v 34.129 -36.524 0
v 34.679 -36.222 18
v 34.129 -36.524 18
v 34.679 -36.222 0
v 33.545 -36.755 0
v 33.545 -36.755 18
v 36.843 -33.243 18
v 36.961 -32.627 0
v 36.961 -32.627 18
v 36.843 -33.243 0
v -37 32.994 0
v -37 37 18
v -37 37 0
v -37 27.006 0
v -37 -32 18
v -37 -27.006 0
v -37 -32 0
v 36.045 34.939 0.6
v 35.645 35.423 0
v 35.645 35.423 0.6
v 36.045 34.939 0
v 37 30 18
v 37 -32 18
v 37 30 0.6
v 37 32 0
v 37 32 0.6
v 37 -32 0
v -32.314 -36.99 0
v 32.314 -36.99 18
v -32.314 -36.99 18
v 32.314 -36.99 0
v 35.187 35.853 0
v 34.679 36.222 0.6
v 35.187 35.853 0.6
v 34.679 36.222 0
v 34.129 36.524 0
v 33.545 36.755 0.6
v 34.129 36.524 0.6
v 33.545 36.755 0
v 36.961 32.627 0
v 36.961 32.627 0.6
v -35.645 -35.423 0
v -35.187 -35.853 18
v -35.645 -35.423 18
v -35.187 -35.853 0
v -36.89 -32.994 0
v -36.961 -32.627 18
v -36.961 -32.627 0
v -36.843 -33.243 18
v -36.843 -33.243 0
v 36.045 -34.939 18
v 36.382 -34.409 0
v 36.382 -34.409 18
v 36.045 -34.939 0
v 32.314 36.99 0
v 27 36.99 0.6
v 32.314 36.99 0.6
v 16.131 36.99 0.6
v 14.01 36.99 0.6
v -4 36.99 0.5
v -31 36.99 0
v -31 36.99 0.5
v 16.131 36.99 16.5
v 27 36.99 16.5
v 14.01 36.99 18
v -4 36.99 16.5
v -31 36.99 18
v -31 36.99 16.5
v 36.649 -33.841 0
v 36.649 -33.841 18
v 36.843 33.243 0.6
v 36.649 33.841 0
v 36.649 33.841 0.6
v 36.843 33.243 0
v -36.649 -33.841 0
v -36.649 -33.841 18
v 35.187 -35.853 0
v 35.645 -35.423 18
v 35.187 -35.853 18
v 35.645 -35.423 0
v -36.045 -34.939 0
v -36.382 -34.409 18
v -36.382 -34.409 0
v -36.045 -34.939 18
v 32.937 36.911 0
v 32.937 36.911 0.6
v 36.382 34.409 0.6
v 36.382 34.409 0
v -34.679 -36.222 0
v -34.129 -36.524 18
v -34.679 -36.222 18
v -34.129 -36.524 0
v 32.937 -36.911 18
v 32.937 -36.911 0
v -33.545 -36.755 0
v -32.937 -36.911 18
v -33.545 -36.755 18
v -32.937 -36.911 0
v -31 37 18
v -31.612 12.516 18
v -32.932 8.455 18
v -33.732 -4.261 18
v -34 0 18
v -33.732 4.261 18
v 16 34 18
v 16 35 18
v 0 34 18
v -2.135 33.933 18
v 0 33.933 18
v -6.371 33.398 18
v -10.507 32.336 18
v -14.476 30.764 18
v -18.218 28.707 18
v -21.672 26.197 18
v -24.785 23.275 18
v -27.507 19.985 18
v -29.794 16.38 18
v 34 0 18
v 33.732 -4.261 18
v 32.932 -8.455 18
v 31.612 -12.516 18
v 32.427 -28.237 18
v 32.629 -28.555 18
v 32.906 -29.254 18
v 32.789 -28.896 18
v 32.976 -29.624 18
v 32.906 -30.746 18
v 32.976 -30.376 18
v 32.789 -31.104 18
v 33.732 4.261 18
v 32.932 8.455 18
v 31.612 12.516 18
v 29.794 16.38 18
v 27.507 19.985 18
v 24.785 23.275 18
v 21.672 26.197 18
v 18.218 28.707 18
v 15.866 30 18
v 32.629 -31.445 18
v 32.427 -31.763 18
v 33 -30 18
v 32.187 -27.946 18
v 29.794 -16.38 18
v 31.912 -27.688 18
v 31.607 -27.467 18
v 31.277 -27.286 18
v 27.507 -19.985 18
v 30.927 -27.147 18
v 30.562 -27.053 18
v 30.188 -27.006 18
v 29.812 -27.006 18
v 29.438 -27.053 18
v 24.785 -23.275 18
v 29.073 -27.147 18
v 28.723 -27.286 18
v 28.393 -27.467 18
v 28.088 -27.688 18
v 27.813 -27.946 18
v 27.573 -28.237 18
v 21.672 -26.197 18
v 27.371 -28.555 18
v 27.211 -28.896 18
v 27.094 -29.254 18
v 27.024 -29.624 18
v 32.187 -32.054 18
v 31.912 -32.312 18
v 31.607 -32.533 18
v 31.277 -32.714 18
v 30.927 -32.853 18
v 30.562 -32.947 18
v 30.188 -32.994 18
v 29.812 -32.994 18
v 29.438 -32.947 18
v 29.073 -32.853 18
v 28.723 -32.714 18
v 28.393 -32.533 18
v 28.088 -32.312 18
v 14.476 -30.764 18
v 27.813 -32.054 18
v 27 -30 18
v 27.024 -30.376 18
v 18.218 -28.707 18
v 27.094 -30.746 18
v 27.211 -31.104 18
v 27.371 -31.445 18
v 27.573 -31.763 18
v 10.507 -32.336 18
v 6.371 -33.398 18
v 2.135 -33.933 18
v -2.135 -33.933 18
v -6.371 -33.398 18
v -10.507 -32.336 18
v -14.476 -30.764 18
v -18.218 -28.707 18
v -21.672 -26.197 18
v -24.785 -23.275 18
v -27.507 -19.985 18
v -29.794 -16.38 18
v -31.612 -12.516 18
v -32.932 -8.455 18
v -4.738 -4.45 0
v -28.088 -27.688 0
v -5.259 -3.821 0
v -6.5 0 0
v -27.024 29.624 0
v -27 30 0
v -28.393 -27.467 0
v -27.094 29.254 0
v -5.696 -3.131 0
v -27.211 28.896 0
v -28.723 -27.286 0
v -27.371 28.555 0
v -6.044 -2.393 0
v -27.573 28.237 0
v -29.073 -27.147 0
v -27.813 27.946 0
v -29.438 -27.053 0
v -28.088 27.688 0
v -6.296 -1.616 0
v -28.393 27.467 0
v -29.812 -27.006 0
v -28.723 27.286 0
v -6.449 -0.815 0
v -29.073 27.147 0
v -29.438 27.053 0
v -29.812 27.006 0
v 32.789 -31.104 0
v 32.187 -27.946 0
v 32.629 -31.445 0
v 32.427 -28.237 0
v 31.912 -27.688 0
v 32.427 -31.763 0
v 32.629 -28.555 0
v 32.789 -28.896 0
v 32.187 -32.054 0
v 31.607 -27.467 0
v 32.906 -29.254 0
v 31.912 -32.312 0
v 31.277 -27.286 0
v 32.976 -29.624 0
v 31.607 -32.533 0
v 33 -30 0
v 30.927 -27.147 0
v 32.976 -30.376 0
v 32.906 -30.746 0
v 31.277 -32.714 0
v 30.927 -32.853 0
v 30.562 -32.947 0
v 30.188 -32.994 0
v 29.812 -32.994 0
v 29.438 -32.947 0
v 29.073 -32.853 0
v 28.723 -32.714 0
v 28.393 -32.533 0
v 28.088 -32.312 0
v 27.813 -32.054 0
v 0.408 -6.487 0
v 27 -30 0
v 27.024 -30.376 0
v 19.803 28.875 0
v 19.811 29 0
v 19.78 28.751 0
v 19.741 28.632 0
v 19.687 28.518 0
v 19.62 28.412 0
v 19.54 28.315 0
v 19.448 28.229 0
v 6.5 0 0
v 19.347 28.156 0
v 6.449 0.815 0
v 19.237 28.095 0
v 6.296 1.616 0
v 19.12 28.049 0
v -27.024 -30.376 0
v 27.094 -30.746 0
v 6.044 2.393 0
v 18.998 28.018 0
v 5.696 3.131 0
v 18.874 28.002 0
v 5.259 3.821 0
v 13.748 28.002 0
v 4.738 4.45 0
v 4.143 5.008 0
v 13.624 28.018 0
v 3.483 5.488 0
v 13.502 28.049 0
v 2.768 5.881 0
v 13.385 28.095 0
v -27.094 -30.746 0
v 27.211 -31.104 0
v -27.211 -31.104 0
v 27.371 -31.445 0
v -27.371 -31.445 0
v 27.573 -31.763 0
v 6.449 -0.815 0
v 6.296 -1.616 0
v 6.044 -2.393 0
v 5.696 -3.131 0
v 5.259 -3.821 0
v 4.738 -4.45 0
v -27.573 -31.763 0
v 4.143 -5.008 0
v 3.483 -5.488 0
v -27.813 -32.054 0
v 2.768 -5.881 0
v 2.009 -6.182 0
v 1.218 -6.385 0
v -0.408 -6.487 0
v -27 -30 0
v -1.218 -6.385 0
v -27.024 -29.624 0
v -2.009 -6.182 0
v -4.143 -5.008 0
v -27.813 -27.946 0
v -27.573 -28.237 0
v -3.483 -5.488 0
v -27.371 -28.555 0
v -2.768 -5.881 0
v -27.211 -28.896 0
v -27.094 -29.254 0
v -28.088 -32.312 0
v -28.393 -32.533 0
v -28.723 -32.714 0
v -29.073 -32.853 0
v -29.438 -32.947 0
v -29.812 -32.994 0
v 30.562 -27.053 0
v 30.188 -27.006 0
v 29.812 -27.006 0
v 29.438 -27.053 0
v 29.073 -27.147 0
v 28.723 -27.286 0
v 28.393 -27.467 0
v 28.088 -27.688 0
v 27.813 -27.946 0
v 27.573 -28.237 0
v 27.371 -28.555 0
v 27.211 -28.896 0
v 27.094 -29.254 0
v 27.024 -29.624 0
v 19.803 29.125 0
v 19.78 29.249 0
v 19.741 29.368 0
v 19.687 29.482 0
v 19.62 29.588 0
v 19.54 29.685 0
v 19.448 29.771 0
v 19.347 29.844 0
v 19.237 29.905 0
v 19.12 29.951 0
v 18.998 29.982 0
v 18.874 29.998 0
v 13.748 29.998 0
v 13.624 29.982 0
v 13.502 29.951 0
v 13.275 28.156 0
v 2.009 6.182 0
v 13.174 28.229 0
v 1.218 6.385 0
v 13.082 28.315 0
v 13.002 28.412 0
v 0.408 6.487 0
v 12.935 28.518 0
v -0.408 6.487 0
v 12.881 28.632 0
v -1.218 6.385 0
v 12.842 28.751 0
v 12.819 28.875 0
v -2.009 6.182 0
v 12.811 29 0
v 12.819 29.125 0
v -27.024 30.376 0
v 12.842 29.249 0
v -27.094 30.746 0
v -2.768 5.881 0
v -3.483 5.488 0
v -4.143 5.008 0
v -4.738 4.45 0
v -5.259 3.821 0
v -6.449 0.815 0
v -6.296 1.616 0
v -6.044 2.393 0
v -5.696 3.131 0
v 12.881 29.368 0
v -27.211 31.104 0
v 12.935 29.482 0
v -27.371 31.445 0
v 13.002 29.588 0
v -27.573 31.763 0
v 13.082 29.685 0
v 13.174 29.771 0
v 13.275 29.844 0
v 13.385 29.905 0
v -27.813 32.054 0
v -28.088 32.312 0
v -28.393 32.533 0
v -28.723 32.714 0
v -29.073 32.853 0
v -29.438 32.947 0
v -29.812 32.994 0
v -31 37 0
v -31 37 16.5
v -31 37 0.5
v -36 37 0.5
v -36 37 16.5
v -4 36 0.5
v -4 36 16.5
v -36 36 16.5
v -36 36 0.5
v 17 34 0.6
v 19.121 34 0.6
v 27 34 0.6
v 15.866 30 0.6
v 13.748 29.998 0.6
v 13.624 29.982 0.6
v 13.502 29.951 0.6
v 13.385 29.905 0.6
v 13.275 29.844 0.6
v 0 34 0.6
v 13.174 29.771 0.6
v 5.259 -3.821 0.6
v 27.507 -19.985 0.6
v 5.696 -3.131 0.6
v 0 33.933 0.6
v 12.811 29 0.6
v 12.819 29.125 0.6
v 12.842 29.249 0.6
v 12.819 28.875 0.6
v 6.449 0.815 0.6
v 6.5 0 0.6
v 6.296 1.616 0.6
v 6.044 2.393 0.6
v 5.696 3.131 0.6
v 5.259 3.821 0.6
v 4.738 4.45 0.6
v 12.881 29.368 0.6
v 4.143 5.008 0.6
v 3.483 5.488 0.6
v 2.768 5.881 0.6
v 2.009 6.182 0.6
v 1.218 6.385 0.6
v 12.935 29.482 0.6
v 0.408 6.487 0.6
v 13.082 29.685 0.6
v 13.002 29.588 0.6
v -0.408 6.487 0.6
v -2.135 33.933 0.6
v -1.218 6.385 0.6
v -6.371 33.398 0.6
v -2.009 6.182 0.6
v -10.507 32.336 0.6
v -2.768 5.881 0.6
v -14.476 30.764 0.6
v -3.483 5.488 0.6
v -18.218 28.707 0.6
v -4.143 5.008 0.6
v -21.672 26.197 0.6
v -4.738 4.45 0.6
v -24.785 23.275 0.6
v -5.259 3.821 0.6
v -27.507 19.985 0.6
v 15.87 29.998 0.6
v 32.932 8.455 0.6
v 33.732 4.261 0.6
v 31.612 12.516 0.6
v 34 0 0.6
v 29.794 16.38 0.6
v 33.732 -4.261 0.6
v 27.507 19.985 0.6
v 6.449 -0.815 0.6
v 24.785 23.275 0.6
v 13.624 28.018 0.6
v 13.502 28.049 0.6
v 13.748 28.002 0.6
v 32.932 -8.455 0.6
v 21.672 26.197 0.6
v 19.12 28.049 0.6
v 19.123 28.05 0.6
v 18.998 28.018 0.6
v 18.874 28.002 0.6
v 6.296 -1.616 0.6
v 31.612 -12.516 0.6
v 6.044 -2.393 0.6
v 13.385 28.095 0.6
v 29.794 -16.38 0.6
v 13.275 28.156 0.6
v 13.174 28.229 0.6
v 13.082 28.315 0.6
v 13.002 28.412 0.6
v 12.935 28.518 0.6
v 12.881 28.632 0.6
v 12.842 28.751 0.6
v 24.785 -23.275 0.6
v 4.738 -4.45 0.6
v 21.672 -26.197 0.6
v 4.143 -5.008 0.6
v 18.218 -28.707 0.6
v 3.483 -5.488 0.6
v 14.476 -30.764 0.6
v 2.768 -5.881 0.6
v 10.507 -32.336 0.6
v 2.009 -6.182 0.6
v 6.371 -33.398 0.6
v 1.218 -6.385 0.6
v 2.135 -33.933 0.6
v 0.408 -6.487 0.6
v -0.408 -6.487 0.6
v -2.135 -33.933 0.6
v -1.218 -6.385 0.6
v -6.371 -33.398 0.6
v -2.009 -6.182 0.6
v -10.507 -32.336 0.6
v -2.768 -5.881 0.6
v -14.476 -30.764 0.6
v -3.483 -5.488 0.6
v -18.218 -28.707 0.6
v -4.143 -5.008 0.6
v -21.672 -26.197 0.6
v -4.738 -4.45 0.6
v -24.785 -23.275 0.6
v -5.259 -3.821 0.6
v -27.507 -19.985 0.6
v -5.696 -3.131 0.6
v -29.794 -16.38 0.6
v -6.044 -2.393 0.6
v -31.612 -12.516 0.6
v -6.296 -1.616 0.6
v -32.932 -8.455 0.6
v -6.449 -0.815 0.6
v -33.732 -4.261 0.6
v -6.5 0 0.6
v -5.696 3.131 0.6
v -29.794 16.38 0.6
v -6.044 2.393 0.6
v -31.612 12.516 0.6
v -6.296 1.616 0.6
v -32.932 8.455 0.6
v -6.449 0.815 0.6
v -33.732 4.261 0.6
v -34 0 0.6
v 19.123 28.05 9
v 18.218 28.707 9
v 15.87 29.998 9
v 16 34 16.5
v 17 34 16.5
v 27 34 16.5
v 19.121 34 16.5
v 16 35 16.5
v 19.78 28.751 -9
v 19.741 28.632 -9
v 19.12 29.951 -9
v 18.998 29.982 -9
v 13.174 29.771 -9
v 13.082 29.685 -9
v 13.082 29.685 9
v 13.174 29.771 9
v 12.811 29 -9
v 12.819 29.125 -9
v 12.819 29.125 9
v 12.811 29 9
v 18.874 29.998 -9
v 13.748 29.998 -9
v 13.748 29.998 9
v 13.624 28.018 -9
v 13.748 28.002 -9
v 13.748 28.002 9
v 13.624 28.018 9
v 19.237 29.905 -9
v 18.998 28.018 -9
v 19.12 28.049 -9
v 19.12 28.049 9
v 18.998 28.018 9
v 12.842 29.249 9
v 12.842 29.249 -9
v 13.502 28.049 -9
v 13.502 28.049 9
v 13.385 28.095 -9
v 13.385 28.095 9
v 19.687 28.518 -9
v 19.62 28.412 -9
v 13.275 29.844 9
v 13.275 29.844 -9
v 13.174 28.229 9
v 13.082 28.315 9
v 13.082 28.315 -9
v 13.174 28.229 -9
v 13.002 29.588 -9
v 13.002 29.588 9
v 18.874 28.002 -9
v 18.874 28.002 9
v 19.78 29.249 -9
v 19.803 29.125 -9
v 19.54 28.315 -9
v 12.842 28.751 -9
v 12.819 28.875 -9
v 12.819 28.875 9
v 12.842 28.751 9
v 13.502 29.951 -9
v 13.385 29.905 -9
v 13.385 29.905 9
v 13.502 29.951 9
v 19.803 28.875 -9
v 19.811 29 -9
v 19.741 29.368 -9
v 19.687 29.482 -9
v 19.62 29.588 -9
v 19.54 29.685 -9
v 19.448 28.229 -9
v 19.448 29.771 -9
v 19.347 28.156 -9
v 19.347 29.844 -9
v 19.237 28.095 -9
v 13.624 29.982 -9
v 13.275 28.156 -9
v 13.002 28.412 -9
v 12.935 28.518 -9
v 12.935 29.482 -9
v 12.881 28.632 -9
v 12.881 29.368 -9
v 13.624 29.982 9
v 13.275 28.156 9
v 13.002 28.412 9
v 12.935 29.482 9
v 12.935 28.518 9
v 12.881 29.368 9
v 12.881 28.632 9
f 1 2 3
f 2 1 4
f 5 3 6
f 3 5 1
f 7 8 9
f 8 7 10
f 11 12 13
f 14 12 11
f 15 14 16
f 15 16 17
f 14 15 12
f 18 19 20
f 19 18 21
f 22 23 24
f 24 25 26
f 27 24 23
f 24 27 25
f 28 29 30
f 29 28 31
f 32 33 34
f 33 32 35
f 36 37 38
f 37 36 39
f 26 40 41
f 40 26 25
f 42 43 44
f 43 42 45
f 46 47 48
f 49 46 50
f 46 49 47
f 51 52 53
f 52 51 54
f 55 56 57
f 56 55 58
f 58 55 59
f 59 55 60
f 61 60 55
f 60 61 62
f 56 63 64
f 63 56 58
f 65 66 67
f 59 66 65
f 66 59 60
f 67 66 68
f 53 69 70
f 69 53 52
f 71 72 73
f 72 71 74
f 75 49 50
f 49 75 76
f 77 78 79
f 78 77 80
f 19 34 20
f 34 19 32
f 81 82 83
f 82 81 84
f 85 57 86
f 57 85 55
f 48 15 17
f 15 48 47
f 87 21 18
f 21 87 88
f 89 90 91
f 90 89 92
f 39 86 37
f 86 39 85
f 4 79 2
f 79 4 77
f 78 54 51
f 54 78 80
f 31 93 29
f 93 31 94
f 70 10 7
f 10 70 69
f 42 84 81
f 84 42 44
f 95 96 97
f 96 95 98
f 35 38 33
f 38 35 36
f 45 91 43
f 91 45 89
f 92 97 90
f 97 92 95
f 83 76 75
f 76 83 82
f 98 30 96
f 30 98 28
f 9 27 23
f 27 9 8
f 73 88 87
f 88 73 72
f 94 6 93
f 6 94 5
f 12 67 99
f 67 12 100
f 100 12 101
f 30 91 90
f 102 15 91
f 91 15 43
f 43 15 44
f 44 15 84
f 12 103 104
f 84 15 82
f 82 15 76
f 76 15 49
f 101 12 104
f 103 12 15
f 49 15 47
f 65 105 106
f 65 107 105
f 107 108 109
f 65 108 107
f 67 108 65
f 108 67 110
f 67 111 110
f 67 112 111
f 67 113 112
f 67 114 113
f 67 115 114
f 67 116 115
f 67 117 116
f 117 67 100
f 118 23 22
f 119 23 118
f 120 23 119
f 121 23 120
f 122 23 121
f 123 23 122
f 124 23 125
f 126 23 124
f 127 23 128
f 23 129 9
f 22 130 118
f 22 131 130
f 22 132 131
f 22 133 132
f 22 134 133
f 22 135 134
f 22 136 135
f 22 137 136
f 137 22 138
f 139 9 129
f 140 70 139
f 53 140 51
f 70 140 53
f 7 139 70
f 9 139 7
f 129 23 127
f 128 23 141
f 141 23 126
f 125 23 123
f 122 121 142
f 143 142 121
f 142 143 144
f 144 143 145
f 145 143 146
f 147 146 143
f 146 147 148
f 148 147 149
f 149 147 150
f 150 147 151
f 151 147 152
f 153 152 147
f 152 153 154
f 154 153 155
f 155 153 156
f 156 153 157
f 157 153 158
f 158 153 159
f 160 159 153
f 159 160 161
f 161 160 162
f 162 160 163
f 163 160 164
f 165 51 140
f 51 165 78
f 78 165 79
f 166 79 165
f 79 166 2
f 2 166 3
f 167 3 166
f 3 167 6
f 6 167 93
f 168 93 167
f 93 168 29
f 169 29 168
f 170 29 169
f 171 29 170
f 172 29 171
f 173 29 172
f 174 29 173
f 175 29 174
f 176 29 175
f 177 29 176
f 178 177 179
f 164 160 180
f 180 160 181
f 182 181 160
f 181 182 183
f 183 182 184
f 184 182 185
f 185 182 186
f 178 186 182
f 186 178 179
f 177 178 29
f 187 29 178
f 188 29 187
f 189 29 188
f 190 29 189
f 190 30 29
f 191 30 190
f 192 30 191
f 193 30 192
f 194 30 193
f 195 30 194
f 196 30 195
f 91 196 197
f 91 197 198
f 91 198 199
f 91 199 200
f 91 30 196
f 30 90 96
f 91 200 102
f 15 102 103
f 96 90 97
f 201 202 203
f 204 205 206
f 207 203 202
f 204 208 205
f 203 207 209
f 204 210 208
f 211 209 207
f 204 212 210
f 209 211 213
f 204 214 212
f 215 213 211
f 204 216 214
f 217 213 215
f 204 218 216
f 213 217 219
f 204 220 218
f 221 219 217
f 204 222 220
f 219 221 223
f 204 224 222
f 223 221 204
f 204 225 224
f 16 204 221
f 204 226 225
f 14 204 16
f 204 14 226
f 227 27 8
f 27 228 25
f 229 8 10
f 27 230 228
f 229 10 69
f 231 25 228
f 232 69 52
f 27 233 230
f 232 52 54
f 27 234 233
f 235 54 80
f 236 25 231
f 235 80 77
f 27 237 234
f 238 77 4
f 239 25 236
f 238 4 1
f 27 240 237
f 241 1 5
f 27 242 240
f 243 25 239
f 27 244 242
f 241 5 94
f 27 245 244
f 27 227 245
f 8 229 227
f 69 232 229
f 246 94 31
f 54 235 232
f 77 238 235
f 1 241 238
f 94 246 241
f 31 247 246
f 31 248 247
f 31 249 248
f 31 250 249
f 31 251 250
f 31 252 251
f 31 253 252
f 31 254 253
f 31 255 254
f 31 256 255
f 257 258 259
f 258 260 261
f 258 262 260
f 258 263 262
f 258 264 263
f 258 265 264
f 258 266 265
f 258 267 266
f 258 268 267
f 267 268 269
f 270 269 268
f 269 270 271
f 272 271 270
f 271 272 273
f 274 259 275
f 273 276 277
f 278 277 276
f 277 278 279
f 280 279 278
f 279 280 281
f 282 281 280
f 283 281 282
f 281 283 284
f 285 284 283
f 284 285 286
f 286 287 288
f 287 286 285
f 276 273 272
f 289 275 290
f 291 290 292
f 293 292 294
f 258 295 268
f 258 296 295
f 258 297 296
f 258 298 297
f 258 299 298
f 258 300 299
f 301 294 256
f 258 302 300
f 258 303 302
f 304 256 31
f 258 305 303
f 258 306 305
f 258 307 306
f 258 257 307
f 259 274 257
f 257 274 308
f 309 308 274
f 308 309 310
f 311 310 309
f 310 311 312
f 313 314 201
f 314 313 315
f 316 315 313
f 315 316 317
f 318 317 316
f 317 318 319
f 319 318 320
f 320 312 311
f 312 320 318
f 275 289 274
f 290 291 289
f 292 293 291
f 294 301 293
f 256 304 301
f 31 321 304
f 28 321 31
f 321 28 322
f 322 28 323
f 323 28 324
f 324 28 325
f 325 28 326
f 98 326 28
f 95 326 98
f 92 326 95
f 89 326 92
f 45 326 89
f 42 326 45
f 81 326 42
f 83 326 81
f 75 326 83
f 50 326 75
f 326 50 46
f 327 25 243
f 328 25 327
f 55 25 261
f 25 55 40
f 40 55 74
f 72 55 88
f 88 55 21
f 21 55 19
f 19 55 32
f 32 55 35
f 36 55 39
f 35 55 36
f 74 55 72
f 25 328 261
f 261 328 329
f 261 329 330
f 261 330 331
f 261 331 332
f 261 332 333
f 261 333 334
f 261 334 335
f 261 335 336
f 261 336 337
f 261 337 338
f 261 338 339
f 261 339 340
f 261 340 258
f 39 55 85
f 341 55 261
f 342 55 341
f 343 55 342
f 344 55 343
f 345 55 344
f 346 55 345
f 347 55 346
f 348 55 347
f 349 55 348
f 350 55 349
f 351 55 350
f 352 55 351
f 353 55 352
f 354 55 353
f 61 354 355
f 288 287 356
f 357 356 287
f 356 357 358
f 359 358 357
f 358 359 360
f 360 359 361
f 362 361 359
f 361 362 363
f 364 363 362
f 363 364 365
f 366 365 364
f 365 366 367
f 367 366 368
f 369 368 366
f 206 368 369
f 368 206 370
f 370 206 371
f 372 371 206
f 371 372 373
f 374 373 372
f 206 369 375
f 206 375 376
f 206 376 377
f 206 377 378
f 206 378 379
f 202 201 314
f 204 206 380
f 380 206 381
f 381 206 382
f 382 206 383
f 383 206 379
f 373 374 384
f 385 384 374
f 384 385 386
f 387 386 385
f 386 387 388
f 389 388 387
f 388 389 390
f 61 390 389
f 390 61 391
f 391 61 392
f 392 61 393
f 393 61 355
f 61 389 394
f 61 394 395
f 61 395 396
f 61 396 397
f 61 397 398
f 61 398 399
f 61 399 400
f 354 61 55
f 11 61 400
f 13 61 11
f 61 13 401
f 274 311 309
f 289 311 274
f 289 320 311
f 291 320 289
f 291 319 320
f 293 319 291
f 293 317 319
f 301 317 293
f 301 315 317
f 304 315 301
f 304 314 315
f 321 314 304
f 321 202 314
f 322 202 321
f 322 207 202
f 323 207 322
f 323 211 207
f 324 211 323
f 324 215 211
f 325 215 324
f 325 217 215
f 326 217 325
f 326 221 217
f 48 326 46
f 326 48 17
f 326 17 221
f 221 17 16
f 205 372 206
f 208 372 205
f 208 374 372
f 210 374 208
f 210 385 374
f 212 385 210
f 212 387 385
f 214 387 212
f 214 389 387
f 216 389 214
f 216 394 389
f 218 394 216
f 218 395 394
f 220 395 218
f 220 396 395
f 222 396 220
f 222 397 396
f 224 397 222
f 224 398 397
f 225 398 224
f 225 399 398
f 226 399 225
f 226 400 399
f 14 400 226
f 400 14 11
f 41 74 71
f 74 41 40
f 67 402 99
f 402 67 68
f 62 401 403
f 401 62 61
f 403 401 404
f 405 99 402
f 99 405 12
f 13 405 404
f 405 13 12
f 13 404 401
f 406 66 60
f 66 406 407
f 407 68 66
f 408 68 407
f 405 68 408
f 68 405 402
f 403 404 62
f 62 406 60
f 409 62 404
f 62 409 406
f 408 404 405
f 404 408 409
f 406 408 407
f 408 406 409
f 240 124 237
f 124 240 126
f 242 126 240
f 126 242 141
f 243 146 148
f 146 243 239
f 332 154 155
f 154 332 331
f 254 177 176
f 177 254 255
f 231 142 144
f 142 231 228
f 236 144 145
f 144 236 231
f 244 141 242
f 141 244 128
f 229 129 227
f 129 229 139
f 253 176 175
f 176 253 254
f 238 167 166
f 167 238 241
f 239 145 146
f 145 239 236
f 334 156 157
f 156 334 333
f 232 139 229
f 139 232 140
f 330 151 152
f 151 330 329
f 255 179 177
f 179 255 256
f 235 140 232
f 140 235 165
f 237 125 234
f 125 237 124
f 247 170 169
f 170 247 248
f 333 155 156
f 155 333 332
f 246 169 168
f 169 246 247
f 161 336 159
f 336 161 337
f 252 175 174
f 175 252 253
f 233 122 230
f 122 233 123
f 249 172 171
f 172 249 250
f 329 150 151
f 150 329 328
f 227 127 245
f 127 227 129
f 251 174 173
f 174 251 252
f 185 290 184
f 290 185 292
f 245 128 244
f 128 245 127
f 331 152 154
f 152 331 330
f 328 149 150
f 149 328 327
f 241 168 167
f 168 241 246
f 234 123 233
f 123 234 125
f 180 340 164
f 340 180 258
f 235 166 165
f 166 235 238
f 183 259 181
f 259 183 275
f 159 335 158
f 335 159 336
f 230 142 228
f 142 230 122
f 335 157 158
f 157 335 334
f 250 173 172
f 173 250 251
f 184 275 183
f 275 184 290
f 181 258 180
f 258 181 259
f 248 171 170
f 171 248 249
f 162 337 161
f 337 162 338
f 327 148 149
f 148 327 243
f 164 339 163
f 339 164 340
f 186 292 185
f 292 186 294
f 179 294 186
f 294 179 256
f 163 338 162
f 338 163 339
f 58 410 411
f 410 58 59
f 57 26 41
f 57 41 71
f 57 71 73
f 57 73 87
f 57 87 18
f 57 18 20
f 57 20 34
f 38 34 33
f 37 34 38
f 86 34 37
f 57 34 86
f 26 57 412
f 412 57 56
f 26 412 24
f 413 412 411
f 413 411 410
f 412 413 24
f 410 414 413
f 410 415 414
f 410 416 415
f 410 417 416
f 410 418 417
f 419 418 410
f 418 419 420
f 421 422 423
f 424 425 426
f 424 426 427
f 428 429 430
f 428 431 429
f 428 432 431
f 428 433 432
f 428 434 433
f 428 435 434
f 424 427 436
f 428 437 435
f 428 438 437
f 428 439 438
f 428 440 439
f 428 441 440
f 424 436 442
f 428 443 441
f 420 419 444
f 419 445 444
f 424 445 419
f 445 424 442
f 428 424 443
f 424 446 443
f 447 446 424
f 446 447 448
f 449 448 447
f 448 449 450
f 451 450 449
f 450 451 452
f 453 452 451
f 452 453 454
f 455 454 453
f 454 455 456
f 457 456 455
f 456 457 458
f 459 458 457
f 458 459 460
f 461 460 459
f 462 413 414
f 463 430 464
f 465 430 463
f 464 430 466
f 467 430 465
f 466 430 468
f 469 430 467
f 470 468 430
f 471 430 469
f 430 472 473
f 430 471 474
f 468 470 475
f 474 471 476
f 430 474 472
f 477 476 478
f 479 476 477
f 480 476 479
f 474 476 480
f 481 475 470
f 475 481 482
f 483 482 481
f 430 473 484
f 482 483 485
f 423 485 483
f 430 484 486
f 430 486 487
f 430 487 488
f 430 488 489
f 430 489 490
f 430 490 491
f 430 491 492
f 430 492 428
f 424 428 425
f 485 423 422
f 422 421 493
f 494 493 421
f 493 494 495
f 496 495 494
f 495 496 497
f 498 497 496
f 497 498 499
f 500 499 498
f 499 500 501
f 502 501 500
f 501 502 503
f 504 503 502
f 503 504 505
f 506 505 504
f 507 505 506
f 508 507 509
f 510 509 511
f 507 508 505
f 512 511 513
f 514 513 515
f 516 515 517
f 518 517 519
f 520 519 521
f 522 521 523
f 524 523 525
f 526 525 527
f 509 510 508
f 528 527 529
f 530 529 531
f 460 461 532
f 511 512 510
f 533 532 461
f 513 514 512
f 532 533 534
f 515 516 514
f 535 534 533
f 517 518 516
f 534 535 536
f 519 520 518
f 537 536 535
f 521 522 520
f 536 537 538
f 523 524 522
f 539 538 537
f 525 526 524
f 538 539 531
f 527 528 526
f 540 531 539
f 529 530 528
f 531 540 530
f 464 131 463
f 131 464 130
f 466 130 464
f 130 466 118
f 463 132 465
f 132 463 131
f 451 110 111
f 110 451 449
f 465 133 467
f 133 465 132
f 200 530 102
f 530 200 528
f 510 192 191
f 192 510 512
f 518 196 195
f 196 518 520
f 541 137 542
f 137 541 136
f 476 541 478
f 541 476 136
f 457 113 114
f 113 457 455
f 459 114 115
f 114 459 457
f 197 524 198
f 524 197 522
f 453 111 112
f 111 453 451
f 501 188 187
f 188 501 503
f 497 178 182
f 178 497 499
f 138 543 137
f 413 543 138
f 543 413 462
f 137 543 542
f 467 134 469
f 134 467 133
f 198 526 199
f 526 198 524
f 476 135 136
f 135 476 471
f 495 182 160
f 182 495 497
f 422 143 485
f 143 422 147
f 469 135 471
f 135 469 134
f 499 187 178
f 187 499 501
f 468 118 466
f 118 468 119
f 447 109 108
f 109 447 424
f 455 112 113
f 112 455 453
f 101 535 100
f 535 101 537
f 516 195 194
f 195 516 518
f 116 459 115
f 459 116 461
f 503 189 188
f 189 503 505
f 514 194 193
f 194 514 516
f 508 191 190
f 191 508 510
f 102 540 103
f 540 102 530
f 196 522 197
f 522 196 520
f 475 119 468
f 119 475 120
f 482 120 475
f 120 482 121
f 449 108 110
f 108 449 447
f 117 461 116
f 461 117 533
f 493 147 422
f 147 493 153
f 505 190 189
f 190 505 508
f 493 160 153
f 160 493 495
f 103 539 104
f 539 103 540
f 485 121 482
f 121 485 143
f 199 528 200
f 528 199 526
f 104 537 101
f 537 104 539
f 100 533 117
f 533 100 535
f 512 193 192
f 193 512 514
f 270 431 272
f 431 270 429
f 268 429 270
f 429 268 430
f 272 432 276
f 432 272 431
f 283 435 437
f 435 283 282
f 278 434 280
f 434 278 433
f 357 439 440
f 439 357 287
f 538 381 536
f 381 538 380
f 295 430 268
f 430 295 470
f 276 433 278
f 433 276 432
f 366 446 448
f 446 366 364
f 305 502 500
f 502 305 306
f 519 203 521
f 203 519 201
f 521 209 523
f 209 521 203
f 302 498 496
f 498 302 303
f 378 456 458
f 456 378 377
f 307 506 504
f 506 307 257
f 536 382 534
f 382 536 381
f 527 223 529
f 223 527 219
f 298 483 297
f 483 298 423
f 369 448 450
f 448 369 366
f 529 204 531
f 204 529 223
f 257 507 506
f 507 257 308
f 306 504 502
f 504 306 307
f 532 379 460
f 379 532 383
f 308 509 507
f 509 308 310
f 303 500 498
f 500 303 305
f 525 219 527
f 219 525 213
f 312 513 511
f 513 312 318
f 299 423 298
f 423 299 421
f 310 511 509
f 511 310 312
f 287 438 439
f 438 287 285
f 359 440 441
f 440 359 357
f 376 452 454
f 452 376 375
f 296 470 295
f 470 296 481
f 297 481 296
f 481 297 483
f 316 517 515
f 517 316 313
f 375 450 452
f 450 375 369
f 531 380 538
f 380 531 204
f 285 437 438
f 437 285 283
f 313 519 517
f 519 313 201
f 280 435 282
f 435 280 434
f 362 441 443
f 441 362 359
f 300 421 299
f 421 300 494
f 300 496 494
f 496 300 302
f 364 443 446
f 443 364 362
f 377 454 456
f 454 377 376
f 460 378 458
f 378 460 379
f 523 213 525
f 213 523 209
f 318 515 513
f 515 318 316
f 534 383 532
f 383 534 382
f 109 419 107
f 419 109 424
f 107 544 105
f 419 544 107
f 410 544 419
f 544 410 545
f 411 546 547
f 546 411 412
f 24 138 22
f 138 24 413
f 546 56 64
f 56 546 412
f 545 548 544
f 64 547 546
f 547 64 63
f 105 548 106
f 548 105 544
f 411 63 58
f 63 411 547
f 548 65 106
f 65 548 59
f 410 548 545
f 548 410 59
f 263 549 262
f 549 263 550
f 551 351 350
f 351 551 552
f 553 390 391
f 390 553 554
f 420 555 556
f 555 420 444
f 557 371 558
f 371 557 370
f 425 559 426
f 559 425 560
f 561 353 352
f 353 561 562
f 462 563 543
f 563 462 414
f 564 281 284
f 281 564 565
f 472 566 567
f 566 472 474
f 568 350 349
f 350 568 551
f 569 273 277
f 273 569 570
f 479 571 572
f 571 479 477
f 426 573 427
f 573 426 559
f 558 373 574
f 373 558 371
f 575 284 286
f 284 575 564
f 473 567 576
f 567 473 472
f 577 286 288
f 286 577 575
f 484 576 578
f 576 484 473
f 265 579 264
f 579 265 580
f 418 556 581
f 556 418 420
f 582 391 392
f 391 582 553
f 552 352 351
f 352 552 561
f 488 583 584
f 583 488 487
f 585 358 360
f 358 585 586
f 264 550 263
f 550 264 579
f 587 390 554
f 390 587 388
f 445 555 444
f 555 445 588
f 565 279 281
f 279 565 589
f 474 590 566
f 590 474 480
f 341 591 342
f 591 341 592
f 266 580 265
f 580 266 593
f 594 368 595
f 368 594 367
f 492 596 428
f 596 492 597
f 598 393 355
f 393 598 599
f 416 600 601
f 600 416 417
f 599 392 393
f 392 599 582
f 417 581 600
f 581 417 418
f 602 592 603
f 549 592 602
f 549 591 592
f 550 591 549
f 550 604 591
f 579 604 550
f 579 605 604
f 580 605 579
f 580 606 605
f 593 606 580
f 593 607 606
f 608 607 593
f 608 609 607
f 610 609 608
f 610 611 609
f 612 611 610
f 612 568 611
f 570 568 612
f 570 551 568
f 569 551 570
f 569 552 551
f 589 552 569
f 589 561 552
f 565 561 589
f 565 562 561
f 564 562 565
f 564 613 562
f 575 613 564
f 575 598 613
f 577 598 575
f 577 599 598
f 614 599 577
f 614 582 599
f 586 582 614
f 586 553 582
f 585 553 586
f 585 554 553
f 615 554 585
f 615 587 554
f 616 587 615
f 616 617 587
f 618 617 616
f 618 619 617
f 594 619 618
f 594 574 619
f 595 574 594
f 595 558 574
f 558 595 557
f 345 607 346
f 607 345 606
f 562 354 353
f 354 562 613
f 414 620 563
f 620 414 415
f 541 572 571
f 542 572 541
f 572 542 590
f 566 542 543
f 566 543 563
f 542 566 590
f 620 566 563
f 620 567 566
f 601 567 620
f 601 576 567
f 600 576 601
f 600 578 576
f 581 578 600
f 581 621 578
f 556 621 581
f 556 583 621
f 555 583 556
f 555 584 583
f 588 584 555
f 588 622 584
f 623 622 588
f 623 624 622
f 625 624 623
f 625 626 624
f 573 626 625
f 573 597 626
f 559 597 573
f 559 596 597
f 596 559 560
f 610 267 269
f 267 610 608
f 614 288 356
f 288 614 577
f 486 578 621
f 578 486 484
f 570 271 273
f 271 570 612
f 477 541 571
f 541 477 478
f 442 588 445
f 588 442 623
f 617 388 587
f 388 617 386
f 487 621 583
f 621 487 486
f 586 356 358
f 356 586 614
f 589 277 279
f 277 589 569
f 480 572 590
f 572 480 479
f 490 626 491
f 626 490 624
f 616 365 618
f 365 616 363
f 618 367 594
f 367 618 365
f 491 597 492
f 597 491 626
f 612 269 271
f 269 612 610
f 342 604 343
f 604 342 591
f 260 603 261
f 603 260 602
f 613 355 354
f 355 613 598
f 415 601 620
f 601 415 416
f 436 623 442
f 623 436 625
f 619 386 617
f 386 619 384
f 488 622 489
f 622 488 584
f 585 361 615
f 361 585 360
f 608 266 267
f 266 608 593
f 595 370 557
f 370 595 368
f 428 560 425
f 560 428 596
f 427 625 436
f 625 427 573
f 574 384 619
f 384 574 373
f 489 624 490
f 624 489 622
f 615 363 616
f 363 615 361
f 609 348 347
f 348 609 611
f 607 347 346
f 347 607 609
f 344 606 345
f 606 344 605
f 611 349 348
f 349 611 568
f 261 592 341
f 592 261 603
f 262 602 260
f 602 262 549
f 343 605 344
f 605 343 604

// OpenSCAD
$fn = 50;


union() {
	difference() {
		union() {
			hull() {
				translate(v = [-32.0000000000, 32.0000000000, 0]) {
					cylinder(h = 18, r = 5);
				}
				translate(v = [32.0000000000, 32.0000000000, 0]) {
					cylinder(h = 18, r = 5);
				}
				translate(v = [-32.0000000000, -32.0000000000, 0]) {
					cylinder(h = 18, r = 5);
				}
				translate(v = [32.0000000000, -32.0000000000, 0]) {
					cylinder(h = 18, r = 5);
				}
			}
			translate(v = [-37.0000000000, 31.0000000000, 0]) {
				cube(size = [6, 6, 18]);
			}
		}
		union() {
			translate(v = [-37.5000000000, -30.0000000000, -250.0000000000]) {
				rotate(a = [0, 0, 0]) {
					difference() {
						union() {
							hull() {
								translate(v = [7.5000000000, 0, 0]) {
									cylinder(h = 250, r = 3.0000000000, r1 = 3.0000000000, r2 = 3.0000000000);
								}
								translate(v = [-7.5000000000, 0, 0]) {
									cylinder(h = 250, r = 3.0000000000, r1 = 3.0000000000, r2 = 3.0000000000);
								}
							}
						}
						union();
					}
				}
			}
			translate(v = [-37.5000000000, 30.0000000000, -250.0000000000]) {
				rotate(a = [0, 0, 0]) {
					difference() {
						union() {
							hull() {
								translate(v = [7.5000000000, 0, 0]) {
									cylinder(h = 250, r = 3.0000000000, r1 = 3.0000000000, r2 = 3.0000000000);
								}
								translate(v = [-7.5000000000, 0, 0]) {
									cylinder(h = 250, r = 3.0000000000, r1 = 3.0000000000, r2 = 3.0000000000);
								}
							}
						}
						union();
					}
				}
			}
			translate(v = [-36.0000000000, 36.0000000000, 0.5000000000]) {
				cube(size = [32, 1, 16]);
			}
			translate(v = [30.0000000000, -30.0000000000, 0]) {
				cylinder(h = 100, r = 3.0000000000);
			}
			translate(v = [0, 0, 0.6000000000]) {
				cylinder(h = 20.4000000000, r = 34.0000000000);
			}
			translate(v = [0, 0, -9.0000000000]) {
				cylinder(h = 18, r = 6.5000000000);
			}
			translate(v = [0.0000000000, 30.0000000000, 0.6000000000]) {
				cube(size = [37.0000000000, 4, 20.4000000000]);
			}
			translate(v = [27.0000000000, 30.0000000000, 0.6000000000]) {
				cube(size = [10, 7, 20.4000000000]);
			}
			translate(v = [16.0000000000, 30.0000000000, 16.5000000000]) {
				cube(size = [21, 7, 1.5000000000]);
			}
			translate(v = [13.2500000000, 37.7500000000, 0.6000000000]) {
				rotate(a = [0, 0, -45]) {
					cube(size = [7.5000000000, 1.5000000000, 20.4000000000]);
				}
			}
			translate(v = [7.0610000000, 28.0000000000, 0.6000000000]) {
				cube(size = [7.5000000000, 2, 17.4000000000]);
			}
		}
	}
	union() {
		translate(v = [16.3110000000, 29.0000000000, -9.0000000000]) {
			rotate(a = [0, 0, 0]) {
				difference() {
					union() {
						#hull() {
							#translate(v = [2.5000000000, 0, 0]) {
								cylinder(h = 18, r = 1.0000000000, r1 = 1.0000000000, r2 = 1.0000000000);
							}
							#translate(v = [-2.5000000000, 0, 0]) {
								cylinder(h = 18, r = 1.0000000000, r1 = 1.0000000000, r2 = 1.0000000000);
							}
						}
					}
					union();
				}
			}
		}
	}
}
